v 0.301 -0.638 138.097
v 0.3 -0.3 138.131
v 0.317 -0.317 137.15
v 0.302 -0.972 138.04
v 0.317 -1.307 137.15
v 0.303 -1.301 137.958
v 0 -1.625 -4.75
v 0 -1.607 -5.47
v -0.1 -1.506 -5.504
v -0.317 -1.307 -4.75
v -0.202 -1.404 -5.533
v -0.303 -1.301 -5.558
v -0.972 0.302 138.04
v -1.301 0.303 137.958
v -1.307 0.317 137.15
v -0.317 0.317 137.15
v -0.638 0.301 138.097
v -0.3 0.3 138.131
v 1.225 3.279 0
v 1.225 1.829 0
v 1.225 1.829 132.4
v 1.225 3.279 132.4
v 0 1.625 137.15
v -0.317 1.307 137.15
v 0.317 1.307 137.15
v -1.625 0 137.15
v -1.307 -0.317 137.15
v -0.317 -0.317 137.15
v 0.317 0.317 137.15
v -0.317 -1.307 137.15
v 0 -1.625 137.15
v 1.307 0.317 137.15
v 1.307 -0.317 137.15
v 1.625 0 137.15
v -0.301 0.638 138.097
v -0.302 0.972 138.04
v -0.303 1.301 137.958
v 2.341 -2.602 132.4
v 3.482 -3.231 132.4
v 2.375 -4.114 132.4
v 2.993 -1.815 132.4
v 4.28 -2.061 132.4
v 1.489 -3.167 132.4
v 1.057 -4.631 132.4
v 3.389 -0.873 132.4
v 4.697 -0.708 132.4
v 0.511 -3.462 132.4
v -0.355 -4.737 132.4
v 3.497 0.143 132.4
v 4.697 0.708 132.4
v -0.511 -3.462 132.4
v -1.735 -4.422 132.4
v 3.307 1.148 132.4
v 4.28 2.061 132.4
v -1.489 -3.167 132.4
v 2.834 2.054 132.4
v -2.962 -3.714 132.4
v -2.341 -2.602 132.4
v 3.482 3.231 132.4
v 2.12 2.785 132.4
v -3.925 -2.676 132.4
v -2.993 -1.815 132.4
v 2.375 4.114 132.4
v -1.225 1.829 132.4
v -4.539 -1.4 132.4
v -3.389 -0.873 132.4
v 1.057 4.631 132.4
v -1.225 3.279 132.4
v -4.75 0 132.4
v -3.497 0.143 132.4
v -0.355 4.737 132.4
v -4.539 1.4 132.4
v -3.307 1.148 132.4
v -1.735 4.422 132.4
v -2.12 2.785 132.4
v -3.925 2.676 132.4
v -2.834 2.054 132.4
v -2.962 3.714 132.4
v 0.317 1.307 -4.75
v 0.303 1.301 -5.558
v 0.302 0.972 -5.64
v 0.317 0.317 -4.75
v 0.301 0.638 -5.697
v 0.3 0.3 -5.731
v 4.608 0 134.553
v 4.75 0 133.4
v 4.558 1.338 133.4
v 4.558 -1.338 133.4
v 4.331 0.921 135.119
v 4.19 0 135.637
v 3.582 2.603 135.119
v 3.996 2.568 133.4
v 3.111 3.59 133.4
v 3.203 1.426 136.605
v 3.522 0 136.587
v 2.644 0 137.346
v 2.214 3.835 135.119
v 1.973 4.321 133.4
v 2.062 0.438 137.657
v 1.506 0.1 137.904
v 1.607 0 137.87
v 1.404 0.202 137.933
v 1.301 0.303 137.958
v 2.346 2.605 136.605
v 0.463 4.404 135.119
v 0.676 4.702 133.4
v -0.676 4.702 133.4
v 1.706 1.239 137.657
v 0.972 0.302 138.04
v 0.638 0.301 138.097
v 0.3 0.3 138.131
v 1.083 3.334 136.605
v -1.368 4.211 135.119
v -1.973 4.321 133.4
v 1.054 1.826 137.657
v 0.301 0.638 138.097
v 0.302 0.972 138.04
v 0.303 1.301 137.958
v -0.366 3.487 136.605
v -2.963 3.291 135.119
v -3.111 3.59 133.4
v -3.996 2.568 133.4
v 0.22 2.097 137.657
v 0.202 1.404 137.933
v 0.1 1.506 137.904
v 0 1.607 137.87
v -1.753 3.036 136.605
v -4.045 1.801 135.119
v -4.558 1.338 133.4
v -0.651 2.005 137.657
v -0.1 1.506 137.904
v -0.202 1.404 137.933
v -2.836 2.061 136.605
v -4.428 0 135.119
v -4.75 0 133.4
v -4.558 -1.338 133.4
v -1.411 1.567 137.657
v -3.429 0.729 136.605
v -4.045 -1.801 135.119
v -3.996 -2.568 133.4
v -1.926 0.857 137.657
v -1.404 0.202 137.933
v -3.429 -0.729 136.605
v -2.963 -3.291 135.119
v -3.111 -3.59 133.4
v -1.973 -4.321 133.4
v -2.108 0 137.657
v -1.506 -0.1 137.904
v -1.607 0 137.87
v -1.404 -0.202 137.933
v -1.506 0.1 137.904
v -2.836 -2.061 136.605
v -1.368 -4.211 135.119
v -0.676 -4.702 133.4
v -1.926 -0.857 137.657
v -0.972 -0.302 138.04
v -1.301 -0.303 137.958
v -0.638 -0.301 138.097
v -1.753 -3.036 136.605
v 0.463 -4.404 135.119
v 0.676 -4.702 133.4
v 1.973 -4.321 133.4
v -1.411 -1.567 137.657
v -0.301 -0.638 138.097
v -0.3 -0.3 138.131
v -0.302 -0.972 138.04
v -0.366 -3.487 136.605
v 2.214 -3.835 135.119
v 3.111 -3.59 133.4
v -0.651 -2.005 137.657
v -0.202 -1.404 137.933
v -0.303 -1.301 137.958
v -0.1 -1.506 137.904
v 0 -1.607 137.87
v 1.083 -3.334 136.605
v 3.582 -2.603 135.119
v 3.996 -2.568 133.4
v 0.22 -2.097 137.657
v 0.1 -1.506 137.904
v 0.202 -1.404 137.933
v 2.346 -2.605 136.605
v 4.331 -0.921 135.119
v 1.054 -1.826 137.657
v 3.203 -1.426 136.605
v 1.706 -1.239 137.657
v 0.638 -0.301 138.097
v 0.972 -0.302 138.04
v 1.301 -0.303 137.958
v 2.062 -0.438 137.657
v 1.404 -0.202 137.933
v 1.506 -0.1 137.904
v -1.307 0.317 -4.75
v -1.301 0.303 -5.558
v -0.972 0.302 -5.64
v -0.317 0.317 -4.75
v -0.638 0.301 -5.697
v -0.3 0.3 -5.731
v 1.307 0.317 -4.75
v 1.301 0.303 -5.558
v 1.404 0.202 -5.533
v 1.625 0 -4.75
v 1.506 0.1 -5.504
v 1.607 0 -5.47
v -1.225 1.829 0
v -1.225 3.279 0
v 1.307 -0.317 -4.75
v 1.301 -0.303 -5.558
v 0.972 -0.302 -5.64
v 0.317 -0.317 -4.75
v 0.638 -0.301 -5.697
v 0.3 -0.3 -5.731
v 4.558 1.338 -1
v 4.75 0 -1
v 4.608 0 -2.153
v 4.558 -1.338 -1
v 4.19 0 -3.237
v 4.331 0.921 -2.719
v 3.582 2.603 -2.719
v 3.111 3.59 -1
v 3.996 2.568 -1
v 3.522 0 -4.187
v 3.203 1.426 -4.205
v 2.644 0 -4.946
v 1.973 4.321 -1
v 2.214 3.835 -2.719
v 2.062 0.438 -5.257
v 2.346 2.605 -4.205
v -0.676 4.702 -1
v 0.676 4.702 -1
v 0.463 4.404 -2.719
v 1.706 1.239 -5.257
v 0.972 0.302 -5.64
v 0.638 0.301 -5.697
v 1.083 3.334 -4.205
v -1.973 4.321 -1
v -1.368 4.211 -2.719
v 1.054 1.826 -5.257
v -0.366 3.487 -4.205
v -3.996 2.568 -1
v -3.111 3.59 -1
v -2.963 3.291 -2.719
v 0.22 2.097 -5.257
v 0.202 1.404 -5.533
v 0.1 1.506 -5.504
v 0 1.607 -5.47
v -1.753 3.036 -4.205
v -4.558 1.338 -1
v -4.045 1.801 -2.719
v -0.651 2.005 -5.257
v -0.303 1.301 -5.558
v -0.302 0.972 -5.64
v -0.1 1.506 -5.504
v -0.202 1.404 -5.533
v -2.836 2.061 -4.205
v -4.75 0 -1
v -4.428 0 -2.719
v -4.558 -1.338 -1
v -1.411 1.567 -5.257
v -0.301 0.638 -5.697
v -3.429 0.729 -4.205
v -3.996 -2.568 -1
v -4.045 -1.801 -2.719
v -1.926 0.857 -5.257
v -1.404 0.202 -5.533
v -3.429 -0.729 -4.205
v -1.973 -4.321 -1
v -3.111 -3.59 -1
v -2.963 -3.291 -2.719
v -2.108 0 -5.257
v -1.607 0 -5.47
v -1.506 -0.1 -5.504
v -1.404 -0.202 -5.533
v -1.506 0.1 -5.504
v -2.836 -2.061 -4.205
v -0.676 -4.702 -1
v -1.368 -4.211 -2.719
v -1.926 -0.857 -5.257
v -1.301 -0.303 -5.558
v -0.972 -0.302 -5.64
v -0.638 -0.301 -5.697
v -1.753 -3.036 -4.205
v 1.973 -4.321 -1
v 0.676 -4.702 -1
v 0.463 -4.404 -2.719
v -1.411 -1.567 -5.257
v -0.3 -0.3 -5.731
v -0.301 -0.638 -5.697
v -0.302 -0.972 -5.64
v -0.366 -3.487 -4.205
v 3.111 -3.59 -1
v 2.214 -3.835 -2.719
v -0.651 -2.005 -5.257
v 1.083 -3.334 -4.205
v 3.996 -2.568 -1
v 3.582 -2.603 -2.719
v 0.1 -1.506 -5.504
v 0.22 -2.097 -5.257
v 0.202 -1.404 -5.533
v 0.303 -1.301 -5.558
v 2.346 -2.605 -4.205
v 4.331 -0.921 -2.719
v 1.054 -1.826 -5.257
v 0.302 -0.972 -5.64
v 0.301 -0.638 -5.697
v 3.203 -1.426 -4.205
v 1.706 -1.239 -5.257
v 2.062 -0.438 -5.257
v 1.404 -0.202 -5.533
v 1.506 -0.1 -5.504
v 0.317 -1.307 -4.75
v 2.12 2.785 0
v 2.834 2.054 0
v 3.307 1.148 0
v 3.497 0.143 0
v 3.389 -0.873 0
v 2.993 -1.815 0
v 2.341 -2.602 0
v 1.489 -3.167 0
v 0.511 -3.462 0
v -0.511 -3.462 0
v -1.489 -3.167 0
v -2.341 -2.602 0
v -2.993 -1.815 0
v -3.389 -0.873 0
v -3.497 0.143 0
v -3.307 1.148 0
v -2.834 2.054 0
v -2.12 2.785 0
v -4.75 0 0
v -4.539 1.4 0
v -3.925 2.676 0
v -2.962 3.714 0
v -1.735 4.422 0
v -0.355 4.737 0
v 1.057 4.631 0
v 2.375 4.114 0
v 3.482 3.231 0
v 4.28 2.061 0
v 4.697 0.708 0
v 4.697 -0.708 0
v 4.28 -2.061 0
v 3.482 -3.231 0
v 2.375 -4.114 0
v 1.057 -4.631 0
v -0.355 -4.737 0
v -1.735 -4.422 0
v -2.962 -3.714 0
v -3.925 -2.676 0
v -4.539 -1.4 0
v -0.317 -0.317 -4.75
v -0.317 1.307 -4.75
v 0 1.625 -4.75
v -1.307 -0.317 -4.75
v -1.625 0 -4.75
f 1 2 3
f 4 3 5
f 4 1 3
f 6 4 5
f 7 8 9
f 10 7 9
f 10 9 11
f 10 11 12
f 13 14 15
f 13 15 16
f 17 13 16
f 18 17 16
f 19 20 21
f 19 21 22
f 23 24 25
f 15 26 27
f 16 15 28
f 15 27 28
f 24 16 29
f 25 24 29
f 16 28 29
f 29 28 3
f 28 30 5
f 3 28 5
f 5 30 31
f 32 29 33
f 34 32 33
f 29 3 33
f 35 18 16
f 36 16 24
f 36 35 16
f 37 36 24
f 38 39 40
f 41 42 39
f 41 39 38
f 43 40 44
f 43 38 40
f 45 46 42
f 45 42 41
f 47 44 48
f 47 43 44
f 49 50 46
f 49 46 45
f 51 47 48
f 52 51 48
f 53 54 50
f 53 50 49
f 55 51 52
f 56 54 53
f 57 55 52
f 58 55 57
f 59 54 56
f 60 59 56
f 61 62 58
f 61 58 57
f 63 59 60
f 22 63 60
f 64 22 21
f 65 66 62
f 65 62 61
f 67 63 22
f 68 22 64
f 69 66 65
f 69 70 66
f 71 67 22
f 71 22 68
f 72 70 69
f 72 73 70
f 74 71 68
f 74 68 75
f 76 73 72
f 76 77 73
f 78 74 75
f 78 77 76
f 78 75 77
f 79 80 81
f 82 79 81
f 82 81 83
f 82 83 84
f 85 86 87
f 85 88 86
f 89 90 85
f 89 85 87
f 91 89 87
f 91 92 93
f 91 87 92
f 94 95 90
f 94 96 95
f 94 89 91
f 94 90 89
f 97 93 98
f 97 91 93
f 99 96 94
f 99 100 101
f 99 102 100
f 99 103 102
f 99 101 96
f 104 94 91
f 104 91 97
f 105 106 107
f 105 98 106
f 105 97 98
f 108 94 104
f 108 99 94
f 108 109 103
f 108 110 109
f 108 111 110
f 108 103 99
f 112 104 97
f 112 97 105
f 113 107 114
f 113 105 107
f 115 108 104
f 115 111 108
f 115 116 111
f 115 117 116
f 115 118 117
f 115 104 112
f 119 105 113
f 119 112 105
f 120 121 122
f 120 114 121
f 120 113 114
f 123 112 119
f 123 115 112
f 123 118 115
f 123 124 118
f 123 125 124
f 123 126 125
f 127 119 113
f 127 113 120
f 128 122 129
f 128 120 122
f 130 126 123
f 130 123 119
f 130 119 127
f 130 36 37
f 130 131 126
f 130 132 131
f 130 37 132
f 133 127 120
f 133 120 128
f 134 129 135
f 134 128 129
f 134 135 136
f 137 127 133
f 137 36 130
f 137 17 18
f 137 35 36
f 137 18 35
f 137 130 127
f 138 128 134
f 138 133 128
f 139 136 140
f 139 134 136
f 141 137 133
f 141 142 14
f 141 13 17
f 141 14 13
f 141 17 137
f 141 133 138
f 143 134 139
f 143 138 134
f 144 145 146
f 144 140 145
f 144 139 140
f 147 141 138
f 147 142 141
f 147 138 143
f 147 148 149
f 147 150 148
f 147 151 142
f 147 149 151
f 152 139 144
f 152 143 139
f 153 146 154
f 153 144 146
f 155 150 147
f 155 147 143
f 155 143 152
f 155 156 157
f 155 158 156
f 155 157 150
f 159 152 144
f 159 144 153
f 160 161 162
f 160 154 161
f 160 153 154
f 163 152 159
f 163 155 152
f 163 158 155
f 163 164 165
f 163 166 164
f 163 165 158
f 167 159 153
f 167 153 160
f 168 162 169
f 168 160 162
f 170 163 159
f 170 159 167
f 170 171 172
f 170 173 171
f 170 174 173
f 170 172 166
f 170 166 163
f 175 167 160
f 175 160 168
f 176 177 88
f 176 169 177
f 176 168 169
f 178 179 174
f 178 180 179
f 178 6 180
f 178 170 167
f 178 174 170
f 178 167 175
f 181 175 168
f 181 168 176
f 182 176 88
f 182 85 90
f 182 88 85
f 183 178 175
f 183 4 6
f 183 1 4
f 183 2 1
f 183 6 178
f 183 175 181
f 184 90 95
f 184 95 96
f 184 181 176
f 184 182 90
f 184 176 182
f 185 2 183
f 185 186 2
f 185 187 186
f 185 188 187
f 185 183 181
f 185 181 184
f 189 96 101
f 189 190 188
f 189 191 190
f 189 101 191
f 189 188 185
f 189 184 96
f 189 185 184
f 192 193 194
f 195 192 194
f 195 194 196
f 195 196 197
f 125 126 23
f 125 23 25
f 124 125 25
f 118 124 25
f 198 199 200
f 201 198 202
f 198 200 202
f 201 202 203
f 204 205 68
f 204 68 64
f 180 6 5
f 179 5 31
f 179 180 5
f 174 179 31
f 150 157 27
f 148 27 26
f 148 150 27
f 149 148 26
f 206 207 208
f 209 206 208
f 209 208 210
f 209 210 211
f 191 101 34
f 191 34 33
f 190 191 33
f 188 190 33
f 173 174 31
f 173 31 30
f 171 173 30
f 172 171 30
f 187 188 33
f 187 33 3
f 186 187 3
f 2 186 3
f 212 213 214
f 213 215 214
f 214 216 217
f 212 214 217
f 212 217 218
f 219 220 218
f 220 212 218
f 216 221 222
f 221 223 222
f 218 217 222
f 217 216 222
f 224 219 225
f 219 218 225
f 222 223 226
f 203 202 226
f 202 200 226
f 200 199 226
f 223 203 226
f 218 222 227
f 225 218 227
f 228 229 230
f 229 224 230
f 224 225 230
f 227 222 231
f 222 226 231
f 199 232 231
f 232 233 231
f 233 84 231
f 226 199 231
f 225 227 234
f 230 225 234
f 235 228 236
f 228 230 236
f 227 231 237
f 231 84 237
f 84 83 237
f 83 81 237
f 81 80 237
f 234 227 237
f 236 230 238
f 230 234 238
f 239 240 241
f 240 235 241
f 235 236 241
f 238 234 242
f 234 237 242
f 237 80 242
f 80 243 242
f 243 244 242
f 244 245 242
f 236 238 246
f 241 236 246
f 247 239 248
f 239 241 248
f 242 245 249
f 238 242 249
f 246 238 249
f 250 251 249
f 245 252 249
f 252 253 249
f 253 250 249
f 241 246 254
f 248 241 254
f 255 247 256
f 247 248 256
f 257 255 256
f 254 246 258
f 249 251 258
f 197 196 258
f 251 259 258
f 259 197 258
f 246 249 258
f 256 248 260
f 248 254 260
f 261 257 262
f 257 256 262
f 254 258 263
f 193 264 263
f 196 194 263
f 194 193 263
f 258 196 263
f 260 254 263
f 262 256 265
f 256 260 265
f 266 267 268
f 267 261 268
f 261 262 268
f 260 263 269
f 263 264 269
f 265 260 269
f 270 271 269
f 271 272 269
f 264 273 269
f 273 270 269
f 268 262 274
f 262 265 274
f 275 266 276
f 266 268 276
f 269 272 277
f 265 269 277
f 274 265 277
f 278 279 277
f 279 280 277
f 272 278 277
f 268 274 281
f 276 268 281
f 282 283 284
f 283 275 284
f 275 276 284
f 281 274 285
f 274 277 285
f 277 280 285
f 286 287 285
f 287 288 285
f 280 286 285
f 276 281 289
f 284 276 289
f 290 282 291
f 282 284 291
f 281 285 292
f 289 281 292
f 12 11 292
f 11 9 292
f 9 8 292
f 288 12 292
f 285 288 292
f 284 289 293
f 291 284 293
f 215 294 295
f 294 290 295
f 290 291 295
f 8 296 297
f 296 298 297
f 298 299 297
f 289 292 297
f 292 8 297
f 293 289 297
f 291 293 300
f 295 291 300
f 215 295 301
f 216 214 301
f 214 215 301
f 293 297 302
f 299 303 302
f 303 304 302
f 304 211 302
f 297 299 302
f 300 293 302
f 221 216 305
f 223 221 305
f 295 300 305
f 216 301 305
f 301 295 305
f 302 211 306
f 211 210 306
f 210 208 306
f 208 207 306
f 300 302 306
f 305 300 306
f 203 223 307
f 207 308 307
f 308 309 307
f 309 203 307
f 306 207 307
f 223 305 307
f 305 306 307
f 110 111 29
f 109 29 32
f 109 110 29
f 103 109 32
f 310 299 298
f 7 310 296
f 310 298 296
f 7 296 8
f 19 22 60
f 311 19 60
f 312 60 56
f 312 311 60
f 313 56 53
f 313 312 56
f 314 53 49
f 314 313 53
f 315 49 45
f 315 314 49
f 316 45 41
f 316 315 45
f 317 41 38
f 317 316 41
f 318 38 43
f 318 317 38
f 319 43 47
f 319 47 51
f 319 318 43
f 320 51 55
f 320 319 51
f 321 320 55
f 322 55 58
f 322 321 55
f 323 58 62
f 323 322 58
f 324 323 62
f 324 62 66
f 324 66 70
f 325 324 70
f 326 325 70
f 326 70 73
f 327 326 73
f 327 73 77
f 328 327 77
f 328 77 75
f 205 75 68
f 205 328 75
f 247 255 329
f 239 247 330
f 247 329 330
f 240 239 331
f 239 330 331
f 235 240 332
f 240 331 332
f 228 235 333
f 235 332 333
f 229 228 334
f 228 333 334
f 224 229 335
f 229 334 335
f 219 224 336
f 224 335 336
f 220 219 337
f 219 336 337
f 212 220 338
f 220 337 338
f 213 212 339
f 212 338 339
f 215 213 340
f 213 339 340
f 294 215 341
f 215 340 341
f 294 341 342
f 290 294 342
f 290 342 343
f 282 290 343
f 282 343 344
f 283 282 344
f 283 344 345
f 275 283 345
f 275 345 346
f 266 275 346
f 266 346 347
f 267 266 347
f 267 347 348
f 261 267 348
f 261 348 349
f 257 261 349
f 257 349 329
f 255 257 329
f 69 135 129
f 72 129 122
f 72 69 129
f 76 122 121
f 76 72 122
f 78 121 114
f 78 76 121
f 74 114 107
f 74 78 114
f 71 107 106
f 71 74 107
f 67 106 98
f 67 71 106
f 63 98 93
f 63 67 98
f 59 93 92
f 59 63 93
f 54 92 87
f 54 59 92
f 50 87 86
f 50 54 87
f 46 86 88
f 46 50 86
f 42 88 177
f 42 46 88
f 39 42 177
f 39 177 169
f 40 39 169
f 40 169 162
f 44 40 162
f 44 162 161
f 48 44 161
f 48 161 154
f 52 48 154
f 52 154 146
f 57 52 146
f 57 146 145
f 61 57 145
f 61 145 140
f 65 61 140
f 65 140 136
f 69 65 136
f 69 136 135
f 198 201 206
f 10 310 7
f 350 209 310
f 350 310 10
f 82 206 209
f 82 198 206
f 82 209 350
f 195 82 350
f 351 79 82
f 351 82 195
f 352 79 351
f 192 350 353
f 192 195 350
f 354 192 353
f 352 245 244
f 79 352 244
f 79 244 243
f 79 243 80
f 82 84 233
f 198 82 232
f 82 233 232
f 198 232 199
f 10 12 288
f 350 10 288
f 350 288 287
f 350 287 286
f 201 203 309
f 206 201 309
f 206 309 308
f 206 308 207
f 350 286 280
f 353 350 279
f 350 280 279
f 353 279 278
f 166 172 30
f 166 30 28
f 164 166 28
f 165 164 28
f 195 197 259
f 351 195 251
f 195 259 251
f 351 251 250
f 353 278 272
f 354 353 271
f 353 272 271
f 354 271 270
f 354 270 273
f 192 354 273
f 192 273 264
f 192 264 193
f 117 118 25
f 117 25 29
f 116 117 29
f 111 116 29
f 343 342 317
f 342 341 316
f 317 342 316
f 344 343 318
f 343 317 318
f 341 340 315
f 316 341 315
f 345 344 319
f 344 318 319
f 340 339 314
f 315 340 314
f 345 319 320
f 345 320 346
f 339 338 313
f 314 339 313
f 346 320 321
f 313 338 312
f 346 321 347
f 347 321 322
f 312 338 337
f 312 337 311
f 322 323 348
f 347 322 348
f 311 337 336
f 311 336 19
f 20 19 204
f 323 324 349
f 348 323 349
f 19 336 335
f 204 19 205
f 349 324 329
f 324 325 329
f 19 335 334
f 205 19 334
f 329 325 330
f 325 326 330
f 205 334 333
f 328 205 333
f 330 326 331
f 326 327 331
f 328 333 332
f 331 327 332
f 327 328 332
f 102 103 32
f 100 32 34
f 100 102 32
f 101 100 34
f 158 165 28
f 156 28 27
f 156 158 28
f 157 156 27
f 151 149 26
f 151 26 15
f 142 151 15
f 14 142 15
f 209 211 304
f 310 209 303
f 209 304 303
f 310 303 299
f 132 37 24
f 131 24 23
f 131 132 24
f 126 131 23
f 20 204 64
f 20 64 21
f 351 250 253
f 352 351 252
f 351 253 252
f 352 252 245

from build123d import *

# Parameters (mm, degrees)
BOSS_EXTRUDE1_DEPTH  = 132.4
SKETCH3_R            = 4.75
BOSS_EXTRUDE2_DEPTH  = 1
CUT_EXTRUDE1_DEPTH   = 1
CUT_EXTRUDE1_DRAFT   = 1
MIRROR1_COPY_1_DEPTH = 1
MIRROR1_COPY_1_DRAFT = 1


with BuildPart() as part:
    # Sketch2 → Boss-Extrude1 (new body)
    with BuildSketch(Plane.XY):
        with BuildLine():
            Line((-1.225, 1.828623949), (1.225, 1.828623949))
            Line((1.225, 1.828623949), (1.225, 3.278623949))
            ThreePointArc((1.225, 3.278623949), (0, -3.5), (-1.225, 3.278623949))
            Line((-1.225, 3.278623949), (-1.225, 1.828623949))
        make_face()
    extrude(amount=BOSS_EXTRUDE1_DEPTH)

    # Sketch3 → Boss-Extrude2 (add)
    with BuildSketch(Plane(origin=(0, 0, 0), x_dir=(-1, 0, 0), z_dir=(0, 0, -1))):
        Circle(SKETCH3_R)
    boss_extrude2 = extrude(amount=BOSS_EXTRUDE2_DEPTH)

    # Sketch4 → Revolve1 (revolve)
    with BuildSketch(Plane(origin=(0, 0, 0), x_dir=(1, 0, 0), z_dir=(0, 1, 0))):
        with BuildLine():
            Line((0, 1), (4.75, 1))
            ThreePointArc((4.75, 1), (3.358757211, 4.358757211), (0, 5.75))
            Line((0, 5.75), (0, 1))
        make_face()
    revolve1 = revolve(axis=Axis((0, 0, -5.75), (0, 0, 1)))


with BuildPart() as cut_extrude1_tool:
    # Sketch5 → Cut-Extrude1 (with draft: the straight prism first)
    with BuildSketch(Plane(origin=(0, 0, -5.75), x_dir=(-1, 0, 0), z_dir=(0, 0, -1))):
        Polygon((0, 1.6), (-0.3, 1.3), (-0.3, 0.3), (-1.3, 0.3), (-1.6, 0), (-1.3, -0.3), (-0.3, -0.3), (-0.3, -1.3), (0, -1.6), (0.3, -1.3), (0.3, -0.3), (1.3, -0.3), (1.6, 0), (1.3, 0.3), (0.3, 0.3), (0.3, 1.3), align=None)
    extrude(amount=-CUT_EXTRUDE1_DEPTH)
    # Cut-Extrude1: the draft: its side faces are tilted about the plane it starts from
    cut_extrude1_sides = [cut_extrude1_tool.faces().sort_by_distance(p)[0] for p in [
        (0.15, 1.45, -5.25),
        (0.3, 0.8, -5.25),
        (0.8, 0.3, -5.25),
        (1.45, 0.15, -5.25),
        (1.45, -0.15, -5.25),
        (0.8, -0.3, -5.25),
        (0.3, -0.8, -5.25),
        (0.15, -1.45, -5.25),
        (-0.15, -1.45, -5.25),
        (-0.3, -0.8, -5.25),
        (-0.8, -0.3, -5.25),
        (-1.45, -0.15, -5.25),
        (-1.45, 0.15, -5.25),
        (-0.8, 0.3, -5.25),
        (-0.3, 0.8, -5.25),
        (-0.15, 1.45, -5.25),
    ]]
    draft(cut_extrude1_sides, Plane(origin=(0, 0, -5.75), x_dir=(-1, 0, 0), z_dir=(0, 0, -1)), CUT_EXTRUDE1_DRAFT)


with BuildPart() as part_1:
    add(part.part)

    # Cut-Extrude1: cut by cut_extrude1_tool
    add(cut_extrude1_tool.part, mode=Mode.SUBTRACT)

    # Mirror1: Boss-Extrude2, Revolve1 across plane
    add(boss_extrude2.mirror(Plane.XY.offset(66.2)))
    add(revolve1.mirror(Plane.XY.offset(66.2)))


with BuildPart() as mirror1_copy_1_tool:
    # Mirror1 copy 1 sketch → Mirror1 copy 1 (with draft: the straight prism first)
    with BuildSketch(Plane(origin=(0, 0, 138.15), x_dir=(-1, 0, 0), z_dir=(0, 0, 1))):
        Polygon((0, -1.6), (-0.3, -1.3), (-0.3, -0.3), (-1.3, -0.3), (-1.6, 0), (-1.3, 0.3), (-0.3, 0.3), (-0.3, 1.3), (0, 1.6), (0.3, 1.3), (0.3, 0.3), (1.3, 0.3), (1.6, 0), (1.3, -0.3), (0.3, -0.3), (0.3, -1.3), align=None)
    extrude(amount=-MIRROR1_COPY_1_DEPTH)
    # Mirror1 copy 1: the draft: its side faces are tilted about the plane it starts from
    mirror1_copy_1_sides = [mirror1_copy_1_tool.faces().sort_by_distance(p)[0] for p in [
        (0.15, 1.45, 137.65),
        (0.3, 0.8, 137.65),
        (0.8, 0.3, 137.65),
        (1.45, 0.15, 137.65),
        (1.45, -0.15, 137.65),
        (0.8, -0.3, 137.65),
        (0.3, -0.8, 137.65),
        (0.15, -1.45, 137.65),
        (-0.15, -1.45, 137.65),
        (-0.3, -0.8, 137.65),
        (-0.8, -0.3, 137.65),
        (-1.45, -0.15, 137.65),
        (-1.45, 0.15, 137.65),
        (-0.8, 0.3, 137.65),
        (-0.3, 0.8, 137.65),
        (-0.15, 1.45, 137.65),
    ]]
    draft(mirror1_copy_1_sides, Plane(origin=(0, 0, 138.15), x_dir=(-1, 0, 0), z_dir=(0, 0, 1)), MIRROR1_COPY_1_DRAFT)


with BuildPart() as part_2:
    add(part_1.part)

    # Mirror1 copy 1: cut by mirror1_copy_1_tool
    add(mirror1_copy_1_tool.part, mode=Mode.SUBTRACT)


solid = part_2.part
